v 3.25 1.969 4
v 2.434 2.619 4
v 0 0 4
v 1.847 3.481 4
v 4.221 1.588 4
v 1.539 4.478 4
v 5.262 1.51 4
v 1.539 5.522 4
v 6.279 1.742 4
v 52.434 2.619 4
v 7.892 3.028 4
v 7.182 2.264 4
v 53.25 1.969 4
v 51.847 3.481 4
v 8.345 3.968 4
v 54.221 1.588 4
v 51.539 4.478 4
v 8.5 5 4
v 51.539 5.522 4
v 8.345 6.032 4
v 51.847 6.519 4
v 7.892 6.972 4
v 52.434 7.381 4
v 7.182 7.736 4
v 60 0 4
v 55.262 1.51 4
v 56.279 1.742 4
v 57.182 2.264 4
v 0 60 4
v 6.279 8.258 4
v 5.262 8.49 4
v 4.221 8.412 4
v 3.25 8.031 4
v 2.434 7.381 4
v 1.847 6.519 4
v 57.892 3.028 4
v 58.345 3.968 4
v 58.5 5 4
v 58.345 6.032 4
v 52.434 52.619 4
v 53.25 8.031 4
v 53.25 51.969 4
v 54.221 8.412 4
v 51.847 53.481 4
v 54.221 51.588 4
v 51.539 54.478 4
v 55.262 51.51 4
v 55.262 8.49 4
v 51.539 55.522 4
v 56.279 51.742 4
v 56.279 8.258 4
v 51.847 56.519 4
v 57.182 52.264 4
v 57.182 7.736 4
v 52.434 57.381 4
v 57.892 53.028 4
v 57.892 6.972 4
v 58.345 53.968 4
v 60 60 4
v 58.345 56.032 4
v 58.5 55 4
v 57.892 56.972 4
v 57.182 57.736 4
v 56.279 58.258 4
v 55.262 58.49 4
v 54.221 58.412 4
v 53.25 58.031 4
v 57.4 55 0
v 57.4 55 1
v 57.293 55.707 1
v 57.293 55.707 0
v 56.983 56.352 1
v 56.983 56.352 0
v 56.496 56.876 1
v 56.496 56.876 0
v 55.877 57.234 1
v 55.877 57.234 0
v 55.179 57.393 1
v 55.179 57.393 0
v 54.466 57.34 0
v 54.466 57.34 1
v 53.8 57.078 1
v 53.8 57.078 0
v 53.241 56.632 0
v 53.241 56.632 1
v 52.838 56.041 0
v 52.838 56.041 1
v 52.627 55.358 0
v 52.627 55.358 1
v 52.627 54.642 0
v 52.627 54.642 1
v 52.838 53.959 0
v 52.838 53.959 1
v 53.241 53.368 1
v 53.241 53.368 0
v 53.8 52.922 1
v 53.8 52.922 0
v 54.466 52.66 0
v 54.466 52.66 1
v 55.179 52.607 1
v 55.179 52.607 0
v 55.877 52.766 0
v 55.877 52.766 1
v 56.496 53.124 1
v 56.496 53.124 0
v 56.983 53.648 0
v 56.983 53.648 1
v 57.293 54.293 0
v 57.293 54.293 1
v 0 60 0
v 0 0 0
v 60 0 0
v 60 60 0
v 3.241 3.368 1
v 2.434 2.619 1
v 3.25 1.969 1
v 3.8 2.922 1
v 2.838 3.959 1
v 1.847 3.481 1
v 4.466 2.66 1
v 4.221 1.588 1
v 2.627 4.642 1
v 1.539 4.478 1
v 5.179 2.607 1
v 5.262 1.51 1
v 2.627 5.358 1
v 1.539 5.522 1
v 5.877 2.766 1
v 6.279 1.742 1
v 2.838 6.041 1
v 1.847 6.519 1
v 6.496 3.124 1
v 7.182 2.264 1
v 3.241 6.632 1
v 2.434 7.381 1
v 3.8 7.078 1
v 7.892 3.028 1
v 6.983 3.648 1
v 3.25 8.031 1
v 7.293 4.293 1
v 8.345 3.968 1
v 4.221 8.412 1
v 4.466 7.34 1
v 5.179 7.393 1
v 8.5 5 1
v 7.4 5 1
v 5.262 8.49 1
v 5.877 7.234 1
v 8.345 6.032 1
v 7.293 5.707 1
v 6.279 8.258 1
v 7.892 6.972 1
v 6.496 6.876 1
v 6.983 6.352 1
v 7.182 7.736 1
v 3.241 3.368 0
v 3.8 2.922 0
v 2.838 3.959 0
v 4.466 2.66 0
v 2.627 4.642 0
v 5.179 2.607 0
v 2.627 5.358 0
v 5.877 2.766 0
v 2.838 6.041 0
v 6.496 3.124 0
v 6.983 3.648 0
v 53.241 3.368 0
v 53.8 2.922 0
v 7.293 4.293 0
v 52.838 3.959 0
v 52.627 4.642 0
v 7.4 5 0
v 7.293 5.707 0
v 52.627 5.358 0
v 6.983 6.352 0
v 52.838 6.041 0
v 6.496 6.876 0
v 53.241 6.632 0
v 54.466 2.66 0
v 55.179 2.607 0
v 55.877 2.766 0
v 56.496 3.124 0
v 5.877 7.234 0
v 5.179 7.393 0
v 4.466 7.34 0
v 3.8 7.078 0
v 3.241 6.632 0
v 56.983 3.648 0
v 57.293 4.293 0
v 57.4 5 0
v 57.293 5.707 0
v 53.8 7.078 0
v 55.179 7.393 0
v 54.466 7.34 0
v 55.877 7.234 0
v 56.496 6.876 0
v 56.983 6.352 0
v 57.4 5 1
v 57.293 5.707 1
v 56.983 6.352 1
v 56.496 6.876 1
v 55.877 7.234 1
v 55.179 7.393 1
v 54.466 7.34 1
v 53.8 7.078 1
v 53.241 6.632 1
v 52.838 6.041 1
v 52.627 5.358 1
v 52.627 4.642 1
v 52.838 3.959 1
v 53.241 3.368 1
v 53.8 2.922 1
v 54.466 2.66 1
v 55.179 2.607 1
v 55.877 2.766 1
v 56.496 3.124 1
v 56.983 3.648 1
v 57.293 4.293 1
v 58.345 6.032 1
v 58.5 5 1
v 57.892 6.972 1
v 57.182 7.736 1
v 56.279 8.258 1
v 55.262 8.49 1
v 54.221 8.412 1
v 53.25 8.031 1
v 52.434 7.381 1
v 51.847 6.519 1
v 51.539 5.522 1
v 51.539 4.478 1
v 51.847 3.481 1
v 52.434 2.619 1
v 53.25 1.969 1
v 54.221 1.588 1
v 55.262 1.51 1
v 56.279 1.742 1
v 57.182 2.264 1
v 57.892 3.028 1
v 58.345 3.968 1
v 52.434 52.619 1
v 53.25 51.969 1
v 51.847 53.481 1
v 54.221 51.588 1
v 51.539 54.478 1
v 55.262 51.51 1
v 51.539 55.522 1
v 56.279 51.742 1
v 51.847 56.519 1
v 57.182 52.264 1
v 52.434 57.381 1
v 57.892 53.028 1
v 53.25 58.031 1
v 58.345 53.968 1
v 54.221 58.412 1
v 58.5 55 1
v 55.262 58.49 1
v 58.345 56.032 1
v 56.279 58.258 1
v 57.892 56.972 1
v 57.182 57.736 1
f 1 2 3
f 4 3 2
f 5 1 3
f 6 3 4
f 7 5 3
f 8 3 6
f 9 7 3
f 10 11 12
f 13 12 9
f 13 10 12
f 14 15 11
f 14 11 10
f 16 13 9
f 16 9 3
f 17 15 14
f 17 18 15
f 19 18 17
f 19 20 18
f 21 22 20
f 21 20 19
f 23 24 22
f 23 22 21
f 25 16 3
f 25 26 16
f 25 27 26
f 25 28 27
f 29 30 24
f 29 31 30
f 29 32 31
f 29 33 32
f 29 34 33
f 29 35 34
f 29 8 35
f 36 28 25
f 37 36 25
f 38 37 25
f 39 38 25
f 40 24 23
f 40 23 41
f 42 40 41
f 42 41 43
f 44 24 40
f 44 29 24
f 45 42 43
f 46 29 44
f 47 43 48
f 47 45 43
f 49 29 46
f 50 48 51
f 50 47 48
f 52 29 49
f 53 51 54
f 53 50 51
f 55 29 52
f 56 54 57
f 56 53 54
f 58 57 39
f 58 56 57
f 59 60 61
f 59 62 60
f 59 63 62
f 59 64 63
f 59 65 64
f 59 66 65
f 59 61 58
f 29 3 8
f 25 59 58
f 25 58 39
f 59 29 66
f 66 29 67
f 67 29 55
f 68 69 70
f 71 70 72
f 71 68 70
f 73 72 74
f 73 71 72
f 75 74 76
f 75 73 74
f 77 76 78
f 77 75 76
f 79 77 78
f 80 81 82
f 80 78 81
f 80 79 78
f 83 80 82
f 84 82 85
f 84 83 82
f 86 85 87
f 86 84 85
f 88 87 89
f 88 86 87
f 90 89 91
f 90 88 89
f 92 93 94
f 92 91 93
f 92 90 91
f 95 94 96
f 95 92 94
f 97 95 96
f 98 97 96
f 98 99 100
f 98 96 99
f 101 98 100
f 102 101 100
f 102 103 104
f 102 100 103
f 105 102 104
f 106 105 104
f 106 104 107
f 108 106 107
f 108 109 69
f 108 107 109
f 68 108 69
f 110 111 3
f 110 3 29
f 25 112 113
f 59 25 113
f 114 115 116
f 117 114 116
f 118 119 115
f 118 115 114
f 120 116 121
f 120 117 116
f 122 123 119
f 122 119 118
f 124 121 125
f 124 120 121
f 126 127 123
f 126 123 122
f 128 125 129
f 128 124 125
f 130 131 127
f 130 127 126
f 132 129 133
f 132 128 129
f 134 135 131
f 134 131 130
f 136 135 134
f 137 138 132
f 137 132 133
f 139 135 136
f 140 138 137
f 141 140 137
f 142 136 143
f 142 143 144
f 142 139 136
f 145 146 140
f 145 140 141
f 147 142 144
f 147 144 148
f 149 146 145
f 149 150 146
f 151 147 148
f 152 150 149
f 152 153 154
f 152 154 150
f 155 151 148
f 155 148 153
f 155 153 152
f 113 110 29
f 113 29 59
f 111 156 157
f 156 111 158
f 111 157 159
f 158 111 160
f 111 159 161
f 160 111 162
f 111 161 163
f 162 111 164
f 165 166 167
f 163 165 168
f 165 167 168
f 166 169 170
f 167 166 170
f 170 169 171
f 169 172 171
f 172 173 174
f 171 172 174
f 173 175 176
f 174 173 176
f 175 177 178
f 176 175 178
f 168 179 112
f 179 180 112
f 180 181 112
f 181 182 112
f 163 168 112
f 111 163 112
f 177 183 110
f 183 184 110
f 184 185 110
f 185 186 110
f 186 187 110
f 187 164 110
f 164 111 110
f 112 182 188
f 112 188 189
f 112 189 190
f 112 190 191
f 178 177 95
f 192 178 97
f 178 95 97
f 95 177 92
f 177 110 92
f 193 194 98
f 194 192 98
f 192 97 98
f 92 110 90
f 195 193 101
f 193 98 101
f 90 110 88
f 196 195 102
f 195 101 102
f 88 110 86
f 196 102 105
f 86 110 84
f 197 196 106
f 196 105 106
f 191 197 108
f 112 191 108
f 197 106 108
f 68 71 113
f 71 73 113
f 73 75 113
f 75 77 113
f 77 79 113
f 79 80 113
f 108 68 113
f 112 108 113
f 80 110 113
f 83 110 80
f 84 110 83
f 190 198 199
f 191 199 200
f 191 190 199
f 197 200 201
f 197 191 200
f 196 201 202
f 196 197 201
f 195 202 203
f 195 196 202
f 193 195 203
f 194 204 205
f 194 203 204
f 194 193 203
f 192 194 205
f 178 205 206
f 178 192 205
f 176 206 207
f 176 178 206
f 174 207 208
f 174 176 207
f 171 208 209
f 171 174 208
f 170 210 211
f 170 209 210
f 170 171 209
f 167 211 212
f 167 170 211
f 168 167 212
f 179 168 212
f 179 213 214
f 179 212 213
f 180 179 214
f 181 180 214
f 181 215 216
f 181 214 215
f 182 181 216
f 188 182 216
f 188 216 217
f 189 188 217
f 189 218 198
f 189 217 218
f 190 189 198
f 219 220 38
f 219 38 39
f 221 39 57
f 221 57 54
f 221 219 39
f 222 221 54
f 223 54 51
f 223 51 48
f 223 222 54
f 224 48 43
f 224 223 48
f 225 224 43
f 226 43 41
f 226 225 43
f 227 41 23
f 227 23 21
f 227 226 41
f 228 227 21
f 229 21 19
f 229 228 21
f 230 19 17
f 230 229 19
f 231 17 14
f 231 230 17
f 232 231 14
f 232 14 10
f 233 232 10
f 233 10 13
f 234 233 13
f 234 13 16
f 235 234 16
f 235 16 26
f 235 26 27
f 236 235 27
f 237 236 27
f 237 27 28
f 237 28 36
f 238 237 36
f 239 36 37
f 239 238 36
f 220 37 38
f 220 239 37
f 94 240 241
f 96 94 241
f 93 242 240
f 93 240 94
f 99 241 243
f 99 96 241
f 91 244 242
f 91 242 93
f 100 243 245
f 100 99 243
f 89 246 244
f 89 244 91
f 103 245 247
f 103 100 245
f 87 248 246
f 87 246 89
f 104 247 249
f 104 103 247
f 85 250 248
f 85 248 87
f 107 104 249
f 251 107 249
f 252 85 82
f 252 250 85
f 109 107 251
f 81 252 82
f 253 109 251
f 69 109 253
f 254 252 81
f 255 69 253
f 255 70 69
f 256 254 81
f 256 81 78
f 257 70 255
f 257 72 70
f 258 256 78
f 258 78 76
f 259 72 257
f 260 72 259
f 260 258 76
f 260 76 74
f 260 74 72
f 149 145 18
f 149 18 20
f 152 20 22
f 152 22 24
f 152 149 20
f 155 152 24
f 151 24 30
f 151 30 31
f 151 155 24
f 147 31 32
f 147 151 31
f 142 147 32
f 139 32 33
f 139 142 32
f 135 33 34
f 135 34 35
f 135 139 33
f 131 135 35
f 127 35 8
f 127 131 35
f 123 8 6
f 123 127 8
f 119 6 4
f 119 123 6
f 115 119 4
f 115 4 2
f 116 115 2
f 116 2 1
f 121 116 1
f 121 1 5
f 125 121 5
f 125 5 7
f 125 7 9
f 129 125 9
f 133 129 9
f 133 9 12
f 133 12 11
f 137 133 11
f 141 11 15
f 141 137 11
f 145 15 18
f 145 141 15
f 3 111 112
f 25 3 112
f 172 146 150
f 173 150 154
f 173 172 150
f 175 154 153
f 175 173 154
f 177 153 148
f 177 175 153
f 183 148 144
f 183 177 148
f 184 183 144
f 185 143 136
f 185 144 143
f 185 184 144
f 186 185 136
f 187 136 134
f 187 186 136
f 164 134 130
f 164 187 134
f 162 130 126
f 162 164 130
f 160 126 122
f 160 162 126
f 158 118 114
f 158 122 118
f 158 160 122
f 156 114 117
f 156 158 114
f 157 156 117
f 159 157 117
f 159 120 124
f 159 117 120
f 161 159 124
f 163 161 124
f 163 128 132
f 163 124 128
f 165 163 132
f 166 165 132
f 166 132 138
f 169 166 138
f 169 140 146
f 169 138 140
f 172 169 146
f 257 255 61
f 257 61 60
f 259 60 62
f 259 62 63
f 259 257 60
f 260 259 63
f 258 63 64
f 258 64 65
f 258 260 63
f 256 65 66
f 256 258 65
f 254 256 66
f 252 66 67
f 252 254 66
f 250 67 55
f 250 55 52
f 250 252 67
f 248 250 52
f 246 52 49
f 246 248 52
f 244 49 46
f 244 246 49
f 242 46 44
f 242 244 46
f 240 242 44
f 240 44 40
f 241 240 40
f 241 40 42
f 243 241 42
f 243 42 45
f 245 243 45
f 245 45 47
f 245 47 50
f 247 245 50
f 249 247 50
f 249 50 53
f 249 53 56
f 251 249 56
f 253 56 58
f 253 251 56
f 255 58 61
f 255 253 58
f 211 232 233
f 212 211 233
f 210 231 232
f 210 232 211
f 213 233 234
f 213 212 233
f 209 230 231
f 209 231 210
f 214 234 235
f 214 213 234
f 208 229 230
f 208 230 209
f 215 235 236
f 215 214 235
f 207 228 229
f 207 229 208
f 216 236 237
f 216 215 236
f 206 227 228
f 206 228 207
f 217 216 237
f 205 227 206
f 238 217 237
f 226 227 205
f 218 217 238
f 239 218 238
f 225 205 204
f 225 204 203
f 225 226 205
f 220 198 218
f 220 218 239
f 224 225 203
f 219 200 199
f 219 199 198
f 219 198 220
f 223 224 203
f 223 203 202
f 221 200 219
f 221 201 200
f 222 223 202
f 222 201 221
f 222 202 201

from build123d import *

# Parameters (mm, degrees)
CYLINDER005_R     = 3.5
CYLINDER005_DEPTH = 3
CYLINDER004_R     = 2.4
CYLINDER004_DEPTH = 10
CYLINDER007_R     = 3.5
CYLINDER007_DEPTH = 3
CYLINDER006_R     = 2.4
CYLINDER006_DEPTH = 10
CYLINDER009_R     = 3.5
CYLINDER009_DEPTH = 3
CYLINDER008_R     = 2.4
CYLINDER008_DEPTH = 10
BOX001_W          = 60
BOX001_H          = 60
BOX001_DEPTH      = 4


with BuildPart() as cylinder005:
    # Cylinder005 → Cylinder005 (new body)
    with BuildSketch(Plane.XY.offset(1)):
        Circle(CYLINDER005_R)
    extrude(amount=CYLINDER005_DEPTH)


with BuildPart() as fusion004:
    # Cylinder004 → Cylinder004 (new body)
    with BuildSketch(Plane.XY):
        Circle(CYLINDER004_R)
    extrude(amount=CYLINDER004_DEPTH)

    # Fusion004: union Cylinder005
    add(cylinder005.part)


with BuildPart() as fusion004_1:
    # Fusion004 placement: moved
    add(fusion004.part.moved(Location((5, 5, 0))))


with BuildPart() as cylinder007:
    # Cylinder007 → Cylinder007 (new body)
    with BuildSketch(Plane.XY.offset(1)):
        Circle(CYLINDER007_R)
    extrude(amount=CYLINDER007_DEPTH)


with BuildPart() as fusion005:
    # Cylinder006 → Cylinder006 (new body)
    with BuildSketch(Plane.XY):
        Circle(CYLINDER006_R)
    extrude(amount=CYLINDER006_DEPTH)

    # Fusion005: union Cylinder007
    add(cylinder007.part)


with BuildPart() as fusion005_1:
    # Fusion005 placement: moved
    add(fusion005.part.moved(Location((55, 5, 0))))


with BuildPart() as cylinder009:
    # Cylinder009 → Cylinder009 (new body)
    with BuildSketch(Plane.XY.offset(1)):
        Circle(CYLINDER009_R)
    extrude(amount=CYLINDER009_DEPTH)


with BuildPart() as compound001:
    # Cylinder008 → Cylinder008 (new body)
    with BuildSketch(Plane.XY):
        Circle(CYLINDER008_R)
    extrude(amount=CYLINDER008_DEPTH)

    # Fusion006: union Cylinder009
    add(cylinder009.part)


with BuildPart() as compound001_1:
    # Fusion006 placement: moved
    add(compound001.part.moved(Location((55, 55, 0))))

    # Compound001: union Fusion004, Fusion005
    add(fusion004_1.part)
    add(fusion005_1.part)


with BuildPart() as kinematicmount_plate01:
    # Box001 → Box001 (new body)
    with BuildSketch(Plane.XY):
        with Locations((30, 30)):
            Rectangle(BOX001_W, BOX001_H)
    extrude(amount=BOX001_DEPTH)

    # Cut002: cut Compound001
    add(compound001_1.part, mode=Mode.SUBTRACT)


solid = kinematicmount_plate01.part
